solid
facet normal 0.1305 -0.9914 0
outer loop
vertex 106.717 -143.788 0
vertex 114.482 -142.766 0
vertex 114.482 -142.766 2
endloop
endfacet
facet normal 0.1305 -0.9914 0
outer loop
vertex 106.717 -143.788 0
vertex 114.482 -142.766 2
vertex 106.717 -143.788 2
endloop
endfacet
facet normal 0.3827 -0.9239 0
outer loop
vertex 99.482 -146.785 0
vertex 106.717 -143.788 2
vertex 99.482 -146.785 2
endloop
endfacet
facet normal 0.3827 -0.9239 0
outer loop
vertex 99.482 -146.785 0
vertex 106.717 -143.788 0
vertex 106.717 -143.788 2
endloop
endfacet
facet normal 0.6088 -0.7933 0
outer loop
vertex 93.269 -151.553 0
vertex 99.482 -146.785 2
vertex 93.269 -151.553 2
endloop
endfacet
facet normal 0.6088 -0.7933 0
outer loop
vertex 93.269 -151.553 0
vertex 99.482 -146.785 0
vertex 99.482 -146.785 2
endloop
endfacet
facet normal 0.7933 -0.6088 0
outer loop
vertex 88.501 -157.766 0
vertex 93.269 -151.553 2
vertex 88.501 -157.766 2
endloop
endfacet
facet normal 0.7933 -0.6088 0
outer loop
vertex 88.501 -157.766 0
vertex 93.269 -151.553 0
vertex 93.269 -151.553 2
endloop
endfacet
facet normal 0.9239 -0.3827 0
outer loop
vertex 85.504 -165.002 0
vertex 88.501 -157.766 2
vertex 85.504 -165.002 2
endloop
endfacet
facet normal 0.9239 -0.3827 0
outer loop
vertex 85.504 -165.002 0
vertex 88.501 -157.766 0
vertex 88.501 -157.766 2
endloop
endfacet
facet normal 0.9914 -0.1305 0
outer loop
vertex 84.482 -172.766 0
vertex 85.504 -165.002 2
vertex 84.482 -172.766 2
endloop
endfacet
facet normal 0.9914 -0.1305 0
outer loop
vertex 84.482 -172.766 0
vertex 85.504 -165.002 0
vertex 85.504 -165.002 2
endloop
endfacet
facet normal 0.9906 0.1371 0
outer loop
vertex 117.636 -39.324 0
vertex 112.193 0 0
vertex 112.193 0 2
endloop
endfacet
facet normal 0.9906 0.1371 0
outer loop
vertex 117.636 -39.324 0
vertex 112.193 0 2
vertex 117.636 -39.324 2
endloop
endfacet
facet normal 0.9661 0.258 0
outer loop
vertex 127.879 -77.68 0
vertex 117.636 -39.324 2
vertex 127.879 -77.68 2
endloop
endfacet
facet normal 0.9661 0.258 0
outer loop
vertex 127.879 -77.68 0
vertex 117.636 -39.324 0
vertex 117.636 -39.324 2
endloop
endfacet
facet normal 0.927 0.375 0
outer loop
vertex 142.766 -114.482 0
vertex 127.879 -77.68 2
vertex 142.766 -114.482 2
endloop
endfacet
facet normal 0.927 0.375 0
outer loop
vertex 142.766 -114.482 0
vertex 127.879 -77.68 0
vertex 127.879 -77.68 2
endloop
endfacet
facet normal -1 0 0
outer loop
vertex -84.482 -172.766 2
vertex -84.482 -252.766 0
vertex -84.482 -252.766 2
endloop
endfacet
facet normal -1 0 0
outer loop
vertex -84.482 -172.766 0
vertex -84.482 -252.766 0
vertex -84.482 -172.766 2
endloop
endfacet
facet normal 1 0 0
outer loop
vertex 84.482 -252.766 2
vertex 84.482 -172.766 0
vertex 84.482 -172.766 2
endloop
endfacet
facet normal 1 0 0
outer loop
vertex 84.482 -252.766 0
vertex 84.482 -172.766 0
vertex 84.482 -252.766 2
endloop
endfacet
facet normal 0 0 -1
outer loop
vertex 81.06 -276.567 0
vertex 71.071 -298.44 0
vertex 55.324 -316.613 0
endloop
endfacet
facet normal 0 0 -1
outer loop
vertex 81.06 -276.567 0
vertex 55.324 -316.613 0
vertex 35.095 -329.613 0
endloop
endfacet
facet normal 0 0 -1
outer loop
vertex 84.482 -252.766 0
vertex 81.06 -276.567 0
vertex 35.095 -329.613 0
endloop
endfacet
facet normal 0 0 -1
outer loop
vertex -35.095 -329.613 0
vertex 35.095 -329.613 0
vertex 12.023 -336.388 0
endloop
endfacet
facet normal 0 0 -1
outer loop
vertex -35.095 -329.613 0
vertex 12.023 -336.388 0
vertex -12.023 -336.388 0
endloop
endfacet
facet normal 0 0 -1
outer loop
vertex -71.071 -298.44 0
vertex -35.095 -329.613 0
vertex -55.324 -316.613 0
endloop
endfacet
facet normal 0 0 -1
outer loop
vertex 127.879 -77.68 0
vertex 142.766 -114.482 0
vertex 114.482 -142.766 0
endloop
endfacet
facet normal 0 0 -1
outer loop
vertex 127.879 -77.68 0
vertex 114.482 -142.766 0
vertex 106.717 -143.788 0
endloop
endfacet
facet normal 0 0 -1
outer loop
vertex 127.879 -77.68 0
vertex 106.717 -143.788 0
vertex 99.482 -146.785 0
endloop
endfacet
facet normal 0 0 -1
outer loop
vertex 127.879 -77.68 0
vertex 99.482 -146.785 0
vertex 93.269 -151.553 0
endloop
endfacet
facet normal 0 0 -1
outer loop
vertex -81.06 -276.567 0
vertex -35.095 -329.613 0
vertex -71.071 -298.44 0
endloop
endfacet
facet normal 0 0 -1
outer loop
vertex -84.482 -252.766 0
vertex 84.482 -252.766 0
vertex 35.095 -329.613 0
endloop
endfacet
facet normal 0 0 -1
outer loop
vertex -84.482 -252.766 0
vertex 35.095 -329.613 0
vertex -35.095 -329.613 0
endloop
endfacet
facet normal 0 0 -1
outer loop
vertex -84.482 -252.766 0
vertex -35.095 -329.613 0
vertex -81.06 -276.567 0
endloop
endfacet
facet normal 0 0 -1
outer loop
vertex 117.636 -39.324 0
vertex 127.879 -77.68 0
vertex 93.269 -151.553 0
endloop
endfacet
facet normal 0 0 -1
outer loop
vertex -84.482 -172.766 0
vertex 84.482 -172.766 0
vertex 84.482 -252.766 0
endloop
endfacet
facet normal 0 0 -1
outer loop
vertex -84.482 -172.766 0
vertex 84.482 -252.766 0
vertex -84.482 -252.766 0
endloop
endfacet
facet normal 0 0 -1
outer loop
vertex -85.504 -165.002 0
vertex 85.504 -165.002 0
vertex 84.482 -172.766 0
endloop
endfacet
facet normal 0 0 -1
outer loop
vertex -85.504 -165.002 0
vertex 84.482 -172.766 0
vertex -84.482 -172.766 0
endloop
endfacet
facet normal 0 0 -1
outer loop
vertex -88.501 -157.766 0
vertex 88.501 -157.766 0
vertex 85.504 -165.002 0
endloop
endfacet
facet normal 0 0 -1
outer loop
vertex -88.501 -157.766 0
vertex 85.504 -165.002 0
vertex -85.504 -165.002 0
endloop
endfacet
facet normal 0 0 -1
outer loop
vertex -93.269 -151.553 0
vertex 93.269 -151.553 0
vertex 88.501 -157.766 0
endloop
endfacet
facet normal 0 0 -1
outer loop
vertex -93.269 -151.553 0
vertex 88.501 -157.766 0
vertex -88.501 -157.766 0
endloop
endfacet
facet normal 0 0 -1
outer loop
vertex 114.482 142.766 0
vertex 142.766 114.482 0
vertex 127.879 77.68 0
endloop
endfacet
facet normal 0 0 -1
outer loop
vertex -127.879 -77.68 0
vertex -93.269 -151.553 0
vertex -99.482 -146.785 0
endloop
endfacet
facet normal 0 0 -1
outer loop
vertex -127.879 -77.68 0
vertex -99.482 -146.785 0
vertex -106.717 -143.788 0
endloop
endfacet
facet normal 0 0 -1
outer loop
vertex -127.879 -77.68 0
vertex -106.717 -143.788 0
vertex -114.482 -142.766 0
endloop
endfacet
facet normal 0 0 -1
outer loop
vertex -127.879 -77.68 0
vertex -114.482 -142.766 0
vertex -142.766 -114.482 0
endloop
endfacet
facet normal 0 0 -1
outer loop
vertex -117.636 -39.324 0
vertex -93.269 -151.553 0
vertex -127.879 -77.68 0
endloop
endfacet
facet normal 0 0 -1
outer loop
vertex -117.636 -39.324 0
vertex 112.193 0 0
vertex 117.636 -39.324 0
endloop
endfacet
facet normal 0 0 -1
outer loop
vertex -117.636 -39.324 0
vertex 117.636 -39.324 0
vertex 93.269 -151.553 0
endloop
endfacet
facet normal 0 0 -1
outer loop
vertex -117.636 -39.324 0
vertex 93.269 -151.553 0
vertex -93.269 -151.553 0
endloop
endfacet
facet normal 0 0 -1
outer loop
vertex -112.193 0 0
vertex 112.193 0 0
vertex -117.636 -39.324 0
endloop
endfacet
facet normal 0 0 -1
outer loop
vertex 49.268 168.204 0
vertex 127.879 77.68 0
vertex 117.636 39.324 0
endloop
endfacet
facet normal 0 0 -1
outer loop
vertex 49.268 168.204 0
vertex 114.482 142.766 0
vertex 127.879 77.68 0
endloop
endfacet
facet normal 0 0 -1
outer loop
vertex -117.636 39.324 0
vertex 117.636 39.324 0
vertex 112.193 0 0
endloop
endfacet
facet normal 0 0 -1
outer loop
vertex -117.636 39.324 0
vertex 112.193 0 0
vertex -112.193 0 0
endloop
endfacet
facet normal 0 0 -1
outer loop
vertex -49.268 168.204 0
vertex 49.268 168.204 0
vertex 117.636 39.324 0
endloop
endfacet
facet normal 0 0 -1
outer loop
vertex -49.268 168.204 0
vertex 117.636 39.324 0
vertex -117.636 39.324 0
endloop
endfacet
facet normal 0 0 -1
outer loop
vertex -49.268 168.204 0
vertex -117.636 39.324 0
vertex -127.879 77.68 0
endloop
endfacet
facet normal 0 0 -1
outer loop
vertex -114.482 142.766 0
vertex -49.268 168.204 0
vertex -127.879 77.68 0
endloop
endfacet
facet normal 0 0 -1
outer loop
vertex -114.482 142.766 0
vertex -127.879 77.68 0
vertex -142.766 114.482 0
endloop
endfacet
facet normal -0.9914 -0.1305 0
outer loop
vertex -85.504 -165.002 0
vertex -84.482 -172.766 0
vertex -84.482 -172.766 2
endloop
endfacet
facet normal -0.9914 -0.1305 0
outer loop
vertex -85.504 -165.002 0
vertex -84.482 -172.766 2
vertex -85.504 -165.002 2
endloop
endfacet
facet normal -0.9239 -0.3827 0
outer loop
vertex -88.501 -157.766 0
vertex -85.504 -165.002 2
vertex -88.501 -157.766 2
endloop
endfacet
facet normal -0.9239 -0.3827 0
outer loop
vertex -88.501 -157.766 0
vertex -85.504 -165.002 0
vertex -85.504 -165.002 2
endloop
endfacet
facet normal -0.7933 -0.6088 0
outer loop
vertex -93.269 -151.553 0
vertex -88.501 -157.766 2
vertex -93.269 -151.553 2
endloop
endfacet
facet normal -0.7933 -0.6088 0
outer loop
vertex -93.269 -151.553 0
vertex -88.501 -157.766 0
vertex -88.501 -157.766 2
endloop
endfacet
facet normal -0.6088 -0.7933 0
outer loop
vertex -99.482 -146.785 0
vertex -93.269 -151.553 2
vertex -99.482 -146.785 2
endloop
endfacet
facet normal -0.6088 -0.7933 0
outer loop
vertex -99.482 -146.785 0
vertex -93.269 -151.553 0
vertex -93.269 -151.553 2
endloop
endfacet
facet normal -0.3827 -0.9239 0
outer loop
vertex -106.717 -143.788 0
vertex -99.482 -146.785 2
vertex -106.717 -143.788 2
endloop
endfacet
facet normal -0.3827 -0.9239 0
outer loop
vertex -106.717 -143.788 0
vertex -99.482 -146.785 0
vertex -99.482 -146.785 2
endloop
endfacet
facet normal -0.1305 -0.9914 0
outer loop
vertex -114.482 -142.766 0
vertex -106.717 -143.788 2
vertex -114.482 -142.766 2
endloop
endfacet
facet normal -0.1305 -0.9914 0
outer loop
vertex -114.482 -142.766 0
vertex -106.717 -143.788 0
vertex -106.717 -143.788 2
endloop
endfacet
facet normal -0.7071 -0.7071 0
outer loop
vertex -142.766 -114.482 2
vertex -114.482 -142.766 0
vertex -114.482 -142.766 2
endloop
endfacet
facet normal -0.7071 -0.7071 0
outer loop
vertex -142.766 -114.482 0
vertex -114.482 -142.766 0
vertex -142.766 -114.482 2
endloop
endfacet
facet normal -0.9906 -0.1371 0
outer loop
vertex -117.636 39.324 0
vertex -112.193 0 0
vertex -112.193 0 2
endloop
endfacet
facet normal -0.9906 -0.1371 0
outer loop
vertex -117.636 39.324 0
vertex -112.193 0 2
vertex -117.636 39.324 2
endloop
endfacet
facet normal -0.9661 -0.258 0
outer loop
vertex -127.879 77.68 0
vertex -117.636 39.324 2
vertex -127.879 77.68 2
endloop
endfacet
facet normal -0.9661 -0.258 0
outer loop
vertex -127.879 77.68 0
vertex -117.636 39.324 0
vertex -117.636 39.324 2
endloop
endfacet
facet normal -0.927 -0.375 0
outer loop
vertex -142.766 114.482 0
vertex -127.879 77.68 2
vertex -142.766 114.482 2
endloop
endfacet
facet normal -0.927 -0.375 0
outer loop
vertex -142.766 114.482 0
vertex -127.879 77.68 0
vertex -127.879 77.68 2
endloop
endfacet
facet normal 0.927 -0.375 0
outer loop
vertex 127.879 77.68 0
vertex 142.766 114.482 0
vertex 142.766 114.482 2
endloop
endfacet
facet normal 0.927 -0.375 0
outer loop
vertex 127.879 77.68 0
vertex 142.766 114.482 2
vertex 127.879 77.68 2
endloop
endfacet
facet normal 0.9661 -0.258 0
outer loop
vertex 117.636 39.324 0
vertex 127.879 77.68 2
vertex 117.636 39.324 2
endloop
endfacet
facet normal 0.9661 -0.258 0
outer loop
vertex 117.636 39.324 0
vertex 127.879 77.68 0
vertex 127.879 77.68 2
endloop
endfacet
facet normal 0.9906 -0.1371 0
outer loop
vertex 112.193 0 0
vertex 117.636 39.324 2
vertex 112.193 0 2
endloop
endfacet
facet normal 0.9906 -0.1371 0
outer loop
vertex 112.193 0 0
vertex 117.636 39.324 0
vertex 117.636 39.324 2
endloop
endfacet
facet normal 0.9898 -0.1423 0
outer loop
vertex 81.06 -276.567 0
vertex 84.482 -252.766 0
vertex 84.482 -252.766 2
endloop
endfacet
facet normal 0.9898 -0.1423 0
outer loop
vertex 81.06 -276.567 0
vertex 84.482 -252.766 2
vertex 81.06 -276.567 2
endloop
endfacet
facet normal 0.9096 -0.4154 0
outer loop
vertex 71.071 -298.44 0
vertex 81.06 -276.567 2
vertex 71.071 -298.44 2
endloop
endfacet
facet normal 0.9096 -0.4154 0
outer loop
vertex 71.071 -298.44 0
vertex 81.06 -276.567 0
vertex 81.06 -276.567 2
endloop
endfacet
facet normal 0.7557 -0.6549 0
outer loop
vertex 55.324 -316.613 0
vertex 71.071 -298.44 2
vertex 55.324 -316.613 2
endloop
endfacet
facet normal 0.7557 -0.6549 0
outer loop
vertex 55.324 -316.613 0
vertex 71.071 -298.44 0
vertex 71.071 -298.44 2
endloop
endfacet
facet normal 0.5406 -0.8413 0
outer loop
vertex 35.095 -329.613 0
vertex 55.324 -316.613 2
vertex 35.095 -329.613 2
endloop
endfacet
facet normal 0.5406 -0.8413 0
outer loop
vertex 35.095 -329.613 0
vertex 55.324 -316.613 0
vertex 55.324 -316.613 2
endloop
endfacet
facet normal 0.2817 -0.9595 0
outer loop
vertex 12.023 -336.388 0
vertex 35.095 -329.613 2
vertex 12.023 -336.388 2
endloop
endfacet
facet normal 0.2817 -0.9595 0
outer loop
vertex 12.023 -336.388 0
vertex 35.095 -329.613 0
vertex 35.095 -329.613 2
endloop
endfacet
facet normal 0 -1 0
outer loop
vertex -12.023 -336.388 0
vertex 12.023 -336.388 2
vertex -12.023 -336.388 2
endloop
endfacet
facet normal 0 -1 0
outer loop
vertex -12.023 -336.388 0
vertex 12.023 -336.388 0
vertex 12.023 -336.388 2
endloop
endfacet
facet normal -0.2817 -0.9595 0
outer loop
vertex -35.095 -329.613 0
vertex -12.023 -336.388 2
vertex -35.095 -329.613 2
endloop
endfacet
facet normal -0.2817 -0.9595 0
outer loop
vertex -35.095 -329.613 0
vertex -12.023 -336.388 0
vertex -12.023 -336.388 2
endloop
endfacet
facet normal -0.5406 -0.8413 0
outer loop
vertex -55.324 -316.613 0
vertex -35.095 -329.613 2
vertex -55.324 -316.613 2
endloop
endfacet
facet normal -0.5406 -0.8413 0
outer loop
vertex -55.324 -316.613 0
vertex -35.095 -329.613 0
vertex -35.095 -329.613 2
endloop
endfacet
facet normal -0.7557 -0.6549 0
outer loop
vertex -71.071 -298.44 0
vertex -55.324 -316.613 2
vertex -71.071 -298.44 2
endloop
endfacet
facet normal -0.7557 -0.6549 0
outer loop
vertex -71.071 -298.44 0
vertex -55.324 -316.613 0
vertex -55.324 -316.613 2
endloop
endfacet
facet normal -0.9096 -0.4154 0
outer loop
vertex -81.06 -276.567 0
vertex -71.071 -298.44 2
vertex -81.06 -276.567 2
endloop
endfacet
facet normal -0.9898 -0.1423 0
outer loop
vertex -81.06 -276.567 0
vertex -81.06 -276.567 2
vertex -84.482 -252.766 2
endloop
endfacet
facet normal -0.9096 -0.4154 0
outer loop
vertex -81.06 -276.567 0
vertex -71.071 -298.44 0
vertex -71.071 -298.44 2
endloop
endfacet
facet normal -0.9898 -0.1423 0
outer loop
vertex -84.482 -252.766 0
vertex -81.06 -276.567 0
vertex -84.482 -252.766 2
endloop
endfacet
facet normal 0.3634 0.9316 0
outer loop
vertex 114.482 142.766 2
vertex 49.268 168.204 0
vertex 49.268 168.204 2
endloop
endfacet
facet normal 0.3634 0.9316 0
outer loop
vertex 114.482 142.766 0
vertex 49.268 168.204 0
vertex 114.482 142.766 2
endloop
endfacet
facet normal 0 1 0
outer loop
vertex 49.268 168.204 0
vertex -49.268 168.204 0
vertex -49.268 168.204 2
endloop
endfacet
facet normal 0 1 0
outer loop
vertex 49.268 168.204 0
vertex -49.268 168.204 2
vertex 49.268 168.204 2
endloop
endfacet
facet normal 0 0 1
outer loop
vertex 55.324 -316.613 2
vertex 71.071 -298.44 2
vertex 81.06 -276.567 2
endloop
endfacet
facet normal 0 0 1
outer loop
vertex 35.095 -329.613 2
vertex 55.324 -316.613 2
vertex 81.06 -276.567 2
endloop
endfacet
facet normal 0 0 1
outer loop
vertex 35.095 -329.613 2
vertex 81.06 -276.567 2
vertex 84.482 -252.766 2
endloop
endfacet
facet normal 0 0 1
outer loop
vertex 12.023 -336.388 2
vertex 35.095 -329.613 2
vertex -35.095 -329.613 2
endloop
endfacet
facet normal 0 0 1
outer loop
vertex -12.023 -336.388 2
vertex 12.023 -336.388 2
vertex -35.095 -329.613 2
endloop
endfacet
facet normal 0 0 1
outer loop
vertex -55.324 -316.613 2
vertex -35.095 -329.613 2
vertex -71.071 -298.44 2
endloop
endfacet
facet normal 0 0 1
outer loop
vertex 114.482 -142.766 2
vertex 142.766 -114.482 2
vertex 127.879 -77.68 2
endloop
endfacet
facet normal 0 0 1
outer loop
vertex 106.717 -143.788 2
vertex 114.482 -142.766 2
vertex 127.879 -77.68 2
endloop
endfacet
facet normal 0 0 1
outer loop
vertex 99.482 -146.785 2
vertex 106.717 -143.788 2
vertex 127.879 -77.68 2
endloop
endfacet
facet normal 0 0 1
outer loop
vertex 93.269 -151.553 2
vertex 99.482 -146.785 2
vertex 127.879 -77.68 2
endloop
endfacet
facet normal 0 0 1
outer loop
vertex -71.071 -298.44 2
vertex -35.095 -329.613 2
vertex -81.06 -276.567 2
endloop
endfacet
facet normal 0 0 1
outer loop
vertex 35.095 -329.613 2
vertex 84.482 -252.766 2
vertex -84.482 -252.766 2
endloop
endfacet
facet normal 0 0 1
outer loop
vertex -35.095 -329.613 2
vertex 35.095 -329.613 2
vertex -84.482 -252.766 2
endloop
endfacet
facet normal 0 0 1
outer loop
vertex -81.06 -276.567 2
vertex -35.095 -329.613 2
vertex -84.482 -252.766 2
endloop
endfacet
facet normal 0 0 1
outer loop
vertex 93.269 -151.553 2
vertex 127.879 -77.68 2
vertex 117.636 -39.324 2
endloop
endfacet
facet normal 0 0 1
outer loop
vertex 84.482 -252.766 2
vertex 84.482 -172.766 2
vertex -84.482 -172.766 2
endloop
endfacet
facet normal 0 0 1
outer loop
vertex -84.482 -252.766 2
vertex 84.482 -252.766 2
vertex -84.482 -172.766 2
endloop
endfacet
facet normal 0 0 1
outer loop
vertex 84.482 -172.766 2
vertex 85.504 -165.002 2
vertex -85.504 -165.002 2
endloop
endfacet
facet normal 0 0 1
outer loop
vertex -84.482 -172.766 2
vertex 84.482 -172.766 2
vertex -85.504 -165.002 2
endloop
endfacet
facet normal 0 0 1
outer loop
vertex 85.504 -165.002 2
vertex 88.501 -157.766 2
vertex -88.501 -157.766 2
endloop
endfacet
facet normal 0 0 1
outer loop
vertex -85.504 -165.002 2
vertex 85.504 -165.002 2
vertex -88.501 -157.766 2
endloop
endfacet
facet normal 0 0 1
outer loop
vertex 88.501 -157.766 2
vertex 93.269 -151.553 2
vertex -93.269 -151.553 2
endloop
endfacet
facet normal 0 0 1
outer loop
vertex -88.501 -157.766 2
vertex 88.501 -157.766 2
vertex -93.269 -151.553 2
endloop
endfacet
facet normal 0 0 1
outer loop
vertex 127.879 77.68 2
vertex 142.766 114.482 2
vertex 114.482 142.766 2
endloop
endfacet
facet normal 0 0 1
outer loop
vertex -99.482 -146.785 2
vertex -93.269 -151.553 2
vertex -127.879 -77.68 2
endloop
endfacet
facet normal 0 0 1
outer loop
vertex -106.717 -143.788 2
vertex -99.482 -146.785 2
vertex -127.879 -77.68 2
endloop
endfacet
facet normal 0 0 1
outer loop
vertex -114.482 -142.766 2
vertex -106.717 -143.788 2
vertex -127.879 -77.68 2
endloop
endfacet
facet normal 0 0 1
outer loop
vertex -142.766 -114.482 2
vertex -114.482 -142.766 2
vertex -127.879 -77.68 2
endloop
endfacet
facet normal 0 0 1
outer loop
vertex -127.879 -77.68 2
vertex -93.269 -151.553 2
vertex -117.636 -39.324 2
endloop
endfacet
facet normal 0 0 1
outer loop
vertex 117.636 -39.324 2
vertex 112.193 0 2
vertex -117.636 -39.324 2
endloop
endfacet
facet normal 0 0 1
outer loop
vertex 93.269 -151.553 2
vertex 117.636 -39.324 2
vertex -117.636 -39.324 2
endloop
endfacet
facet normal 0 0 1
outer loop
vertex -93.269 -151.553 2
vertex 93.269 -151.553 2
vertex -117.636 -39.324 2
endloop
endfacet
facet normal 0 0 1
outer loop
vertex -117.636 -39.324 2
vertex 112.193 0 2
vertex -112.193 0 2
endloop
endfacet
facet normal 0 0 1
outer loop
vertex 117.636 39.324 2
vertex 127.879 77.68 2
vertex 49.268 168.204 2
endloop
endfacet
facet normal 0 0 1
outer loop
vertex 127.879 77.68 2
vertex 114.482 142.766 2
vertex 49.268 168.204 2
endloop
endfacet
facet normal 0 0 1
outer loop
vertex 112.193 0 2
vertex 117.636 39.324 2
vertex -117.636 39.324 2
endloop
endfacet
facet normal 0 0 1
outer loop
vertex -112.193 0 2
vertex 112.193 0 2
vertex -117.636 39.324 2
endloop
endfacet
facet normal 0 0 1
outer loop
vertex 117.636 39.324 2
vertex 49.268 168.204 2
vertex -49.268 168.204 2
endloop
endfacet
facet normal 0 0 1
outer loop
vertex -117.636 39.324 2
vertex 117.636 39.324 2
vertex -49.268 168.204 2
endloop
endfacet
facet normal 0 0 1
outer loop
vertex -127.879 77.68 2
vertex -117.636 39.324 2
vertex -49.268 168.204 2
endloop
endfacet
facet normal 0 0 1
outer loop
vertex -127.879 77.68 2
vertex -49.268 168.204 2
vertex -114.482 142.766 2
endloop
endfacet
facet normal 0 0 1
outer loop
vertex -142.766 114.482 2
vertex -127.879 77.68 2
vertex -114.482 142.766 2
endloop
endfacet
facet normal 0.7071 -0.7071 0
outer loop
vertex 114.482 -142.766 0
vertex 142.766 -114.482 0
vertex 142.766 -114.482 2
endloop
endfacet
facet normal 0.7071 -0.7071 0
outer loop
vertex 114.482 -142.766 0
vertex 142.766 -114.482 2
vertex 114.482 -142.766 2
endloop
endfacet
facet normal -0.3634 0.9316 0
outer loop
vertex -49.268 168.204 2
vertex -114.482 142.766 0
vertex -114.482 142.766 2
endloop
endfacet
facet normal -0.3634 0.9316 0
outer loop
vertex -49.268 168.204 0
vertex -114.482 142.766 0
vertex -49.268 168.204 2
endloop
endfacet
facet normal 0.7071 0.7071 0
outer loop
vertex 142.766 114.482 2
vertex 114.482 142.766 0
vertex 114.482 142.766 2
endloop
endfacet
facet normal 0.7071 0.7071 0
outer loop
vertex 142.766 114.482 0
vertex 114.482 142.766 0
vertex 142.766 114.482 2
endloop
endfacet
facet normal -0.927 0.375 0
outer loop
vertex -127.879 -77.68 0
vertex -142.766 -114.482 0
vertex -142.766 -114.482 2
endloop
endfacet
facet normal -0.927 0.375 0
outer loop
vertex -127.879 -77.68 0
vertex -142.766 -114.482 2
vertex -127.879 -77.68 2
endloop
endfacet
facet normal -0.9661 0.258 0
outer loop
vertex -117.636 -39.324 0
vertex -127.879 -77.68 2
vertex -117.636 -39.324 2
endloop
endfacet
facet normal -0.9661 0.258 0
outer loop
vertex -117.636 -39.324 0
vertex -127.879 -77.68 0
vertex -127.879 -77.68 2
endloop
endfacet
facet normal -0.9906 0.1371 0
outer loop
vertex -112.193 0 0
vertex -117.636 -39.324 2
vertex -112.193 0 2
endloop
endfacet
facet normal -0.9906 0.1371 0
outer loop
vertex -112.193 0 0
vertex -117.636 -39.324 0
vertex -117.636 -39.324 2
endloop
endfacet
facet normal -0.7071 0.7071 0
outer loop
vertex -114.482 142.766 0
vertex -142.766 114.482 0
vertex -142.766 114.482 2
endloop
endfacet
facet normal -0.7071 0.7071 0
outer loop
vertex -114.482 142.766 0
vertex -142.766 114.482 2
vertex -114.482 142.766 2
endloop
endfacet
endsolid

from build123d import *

# Parameters (mm, degrees)
BOSS_EXTRUDE1_DEPTH = 2


with BuildPart() as part:
    # Sketch1 → Boss-Extrude1 (new body)
    with BuildSketch(Plane.XY):
        with BuildLine():
            Line((-142.766074481, 114.481803233), (-114.481803233, 142.766074481))
            Line((-114.481803233, 142.766074481), (-49.267584828, 168.204347178))
            Line((-49.267584828, 168.204347178), (49.267584828, 168.204347178))
            Line((49.267584828, 168.204347178), (114.481803233, 142.766074481))
            Line((114.481803233, 142.766074481), (142.766074481, 114.481803233))
            ThreePointArc((142.766074481, 114.481803233), (122.165206788, 58.660093881), (112.192625845, 0))
            ThreePointArc((112.192625845, 0), (122.165206788, -58.660093881), (142.766074481, -114.481803233))
            Line((142.766074481, -114.481803233), (114.481803233, -142.766074481))
            ThreePointArc((114.481803233, -142.766074481), (93.268599798, -151.552871045), (84.481803233, -172.766074481))
            Line((84.481803233, -172.766074481), (84.481803233, -252.766074481))
            ThreePointArc((84.481803233, -252.766074481), (0, -337.247877714), (-84.481803233, -252.766074481))
            Line((-84.481803233, -252.766074481), (-84.481803233, -172.766074481))
            ThreePointArc((-84.481803233, -172.766074481), (-93.268599798, -151.552871045), (-114.481803233, -142.766074481))
            Line((-114.481803233, -142.766074481), (-142.766074481, -114.481803233))
            ThreePointArc((-142.766074481, -114.481803233), (-122.165206788, -58.660093881), (-112.192625845, 0))
            ThreePointArc((-112.192625845, 0), (-122.165206788, 58.660093881), (-142.766074481, 114.481803233))
        make_face()
    extrude(amount=BOSS_EXTRUDE1_DEPTH)


solid = part.part
